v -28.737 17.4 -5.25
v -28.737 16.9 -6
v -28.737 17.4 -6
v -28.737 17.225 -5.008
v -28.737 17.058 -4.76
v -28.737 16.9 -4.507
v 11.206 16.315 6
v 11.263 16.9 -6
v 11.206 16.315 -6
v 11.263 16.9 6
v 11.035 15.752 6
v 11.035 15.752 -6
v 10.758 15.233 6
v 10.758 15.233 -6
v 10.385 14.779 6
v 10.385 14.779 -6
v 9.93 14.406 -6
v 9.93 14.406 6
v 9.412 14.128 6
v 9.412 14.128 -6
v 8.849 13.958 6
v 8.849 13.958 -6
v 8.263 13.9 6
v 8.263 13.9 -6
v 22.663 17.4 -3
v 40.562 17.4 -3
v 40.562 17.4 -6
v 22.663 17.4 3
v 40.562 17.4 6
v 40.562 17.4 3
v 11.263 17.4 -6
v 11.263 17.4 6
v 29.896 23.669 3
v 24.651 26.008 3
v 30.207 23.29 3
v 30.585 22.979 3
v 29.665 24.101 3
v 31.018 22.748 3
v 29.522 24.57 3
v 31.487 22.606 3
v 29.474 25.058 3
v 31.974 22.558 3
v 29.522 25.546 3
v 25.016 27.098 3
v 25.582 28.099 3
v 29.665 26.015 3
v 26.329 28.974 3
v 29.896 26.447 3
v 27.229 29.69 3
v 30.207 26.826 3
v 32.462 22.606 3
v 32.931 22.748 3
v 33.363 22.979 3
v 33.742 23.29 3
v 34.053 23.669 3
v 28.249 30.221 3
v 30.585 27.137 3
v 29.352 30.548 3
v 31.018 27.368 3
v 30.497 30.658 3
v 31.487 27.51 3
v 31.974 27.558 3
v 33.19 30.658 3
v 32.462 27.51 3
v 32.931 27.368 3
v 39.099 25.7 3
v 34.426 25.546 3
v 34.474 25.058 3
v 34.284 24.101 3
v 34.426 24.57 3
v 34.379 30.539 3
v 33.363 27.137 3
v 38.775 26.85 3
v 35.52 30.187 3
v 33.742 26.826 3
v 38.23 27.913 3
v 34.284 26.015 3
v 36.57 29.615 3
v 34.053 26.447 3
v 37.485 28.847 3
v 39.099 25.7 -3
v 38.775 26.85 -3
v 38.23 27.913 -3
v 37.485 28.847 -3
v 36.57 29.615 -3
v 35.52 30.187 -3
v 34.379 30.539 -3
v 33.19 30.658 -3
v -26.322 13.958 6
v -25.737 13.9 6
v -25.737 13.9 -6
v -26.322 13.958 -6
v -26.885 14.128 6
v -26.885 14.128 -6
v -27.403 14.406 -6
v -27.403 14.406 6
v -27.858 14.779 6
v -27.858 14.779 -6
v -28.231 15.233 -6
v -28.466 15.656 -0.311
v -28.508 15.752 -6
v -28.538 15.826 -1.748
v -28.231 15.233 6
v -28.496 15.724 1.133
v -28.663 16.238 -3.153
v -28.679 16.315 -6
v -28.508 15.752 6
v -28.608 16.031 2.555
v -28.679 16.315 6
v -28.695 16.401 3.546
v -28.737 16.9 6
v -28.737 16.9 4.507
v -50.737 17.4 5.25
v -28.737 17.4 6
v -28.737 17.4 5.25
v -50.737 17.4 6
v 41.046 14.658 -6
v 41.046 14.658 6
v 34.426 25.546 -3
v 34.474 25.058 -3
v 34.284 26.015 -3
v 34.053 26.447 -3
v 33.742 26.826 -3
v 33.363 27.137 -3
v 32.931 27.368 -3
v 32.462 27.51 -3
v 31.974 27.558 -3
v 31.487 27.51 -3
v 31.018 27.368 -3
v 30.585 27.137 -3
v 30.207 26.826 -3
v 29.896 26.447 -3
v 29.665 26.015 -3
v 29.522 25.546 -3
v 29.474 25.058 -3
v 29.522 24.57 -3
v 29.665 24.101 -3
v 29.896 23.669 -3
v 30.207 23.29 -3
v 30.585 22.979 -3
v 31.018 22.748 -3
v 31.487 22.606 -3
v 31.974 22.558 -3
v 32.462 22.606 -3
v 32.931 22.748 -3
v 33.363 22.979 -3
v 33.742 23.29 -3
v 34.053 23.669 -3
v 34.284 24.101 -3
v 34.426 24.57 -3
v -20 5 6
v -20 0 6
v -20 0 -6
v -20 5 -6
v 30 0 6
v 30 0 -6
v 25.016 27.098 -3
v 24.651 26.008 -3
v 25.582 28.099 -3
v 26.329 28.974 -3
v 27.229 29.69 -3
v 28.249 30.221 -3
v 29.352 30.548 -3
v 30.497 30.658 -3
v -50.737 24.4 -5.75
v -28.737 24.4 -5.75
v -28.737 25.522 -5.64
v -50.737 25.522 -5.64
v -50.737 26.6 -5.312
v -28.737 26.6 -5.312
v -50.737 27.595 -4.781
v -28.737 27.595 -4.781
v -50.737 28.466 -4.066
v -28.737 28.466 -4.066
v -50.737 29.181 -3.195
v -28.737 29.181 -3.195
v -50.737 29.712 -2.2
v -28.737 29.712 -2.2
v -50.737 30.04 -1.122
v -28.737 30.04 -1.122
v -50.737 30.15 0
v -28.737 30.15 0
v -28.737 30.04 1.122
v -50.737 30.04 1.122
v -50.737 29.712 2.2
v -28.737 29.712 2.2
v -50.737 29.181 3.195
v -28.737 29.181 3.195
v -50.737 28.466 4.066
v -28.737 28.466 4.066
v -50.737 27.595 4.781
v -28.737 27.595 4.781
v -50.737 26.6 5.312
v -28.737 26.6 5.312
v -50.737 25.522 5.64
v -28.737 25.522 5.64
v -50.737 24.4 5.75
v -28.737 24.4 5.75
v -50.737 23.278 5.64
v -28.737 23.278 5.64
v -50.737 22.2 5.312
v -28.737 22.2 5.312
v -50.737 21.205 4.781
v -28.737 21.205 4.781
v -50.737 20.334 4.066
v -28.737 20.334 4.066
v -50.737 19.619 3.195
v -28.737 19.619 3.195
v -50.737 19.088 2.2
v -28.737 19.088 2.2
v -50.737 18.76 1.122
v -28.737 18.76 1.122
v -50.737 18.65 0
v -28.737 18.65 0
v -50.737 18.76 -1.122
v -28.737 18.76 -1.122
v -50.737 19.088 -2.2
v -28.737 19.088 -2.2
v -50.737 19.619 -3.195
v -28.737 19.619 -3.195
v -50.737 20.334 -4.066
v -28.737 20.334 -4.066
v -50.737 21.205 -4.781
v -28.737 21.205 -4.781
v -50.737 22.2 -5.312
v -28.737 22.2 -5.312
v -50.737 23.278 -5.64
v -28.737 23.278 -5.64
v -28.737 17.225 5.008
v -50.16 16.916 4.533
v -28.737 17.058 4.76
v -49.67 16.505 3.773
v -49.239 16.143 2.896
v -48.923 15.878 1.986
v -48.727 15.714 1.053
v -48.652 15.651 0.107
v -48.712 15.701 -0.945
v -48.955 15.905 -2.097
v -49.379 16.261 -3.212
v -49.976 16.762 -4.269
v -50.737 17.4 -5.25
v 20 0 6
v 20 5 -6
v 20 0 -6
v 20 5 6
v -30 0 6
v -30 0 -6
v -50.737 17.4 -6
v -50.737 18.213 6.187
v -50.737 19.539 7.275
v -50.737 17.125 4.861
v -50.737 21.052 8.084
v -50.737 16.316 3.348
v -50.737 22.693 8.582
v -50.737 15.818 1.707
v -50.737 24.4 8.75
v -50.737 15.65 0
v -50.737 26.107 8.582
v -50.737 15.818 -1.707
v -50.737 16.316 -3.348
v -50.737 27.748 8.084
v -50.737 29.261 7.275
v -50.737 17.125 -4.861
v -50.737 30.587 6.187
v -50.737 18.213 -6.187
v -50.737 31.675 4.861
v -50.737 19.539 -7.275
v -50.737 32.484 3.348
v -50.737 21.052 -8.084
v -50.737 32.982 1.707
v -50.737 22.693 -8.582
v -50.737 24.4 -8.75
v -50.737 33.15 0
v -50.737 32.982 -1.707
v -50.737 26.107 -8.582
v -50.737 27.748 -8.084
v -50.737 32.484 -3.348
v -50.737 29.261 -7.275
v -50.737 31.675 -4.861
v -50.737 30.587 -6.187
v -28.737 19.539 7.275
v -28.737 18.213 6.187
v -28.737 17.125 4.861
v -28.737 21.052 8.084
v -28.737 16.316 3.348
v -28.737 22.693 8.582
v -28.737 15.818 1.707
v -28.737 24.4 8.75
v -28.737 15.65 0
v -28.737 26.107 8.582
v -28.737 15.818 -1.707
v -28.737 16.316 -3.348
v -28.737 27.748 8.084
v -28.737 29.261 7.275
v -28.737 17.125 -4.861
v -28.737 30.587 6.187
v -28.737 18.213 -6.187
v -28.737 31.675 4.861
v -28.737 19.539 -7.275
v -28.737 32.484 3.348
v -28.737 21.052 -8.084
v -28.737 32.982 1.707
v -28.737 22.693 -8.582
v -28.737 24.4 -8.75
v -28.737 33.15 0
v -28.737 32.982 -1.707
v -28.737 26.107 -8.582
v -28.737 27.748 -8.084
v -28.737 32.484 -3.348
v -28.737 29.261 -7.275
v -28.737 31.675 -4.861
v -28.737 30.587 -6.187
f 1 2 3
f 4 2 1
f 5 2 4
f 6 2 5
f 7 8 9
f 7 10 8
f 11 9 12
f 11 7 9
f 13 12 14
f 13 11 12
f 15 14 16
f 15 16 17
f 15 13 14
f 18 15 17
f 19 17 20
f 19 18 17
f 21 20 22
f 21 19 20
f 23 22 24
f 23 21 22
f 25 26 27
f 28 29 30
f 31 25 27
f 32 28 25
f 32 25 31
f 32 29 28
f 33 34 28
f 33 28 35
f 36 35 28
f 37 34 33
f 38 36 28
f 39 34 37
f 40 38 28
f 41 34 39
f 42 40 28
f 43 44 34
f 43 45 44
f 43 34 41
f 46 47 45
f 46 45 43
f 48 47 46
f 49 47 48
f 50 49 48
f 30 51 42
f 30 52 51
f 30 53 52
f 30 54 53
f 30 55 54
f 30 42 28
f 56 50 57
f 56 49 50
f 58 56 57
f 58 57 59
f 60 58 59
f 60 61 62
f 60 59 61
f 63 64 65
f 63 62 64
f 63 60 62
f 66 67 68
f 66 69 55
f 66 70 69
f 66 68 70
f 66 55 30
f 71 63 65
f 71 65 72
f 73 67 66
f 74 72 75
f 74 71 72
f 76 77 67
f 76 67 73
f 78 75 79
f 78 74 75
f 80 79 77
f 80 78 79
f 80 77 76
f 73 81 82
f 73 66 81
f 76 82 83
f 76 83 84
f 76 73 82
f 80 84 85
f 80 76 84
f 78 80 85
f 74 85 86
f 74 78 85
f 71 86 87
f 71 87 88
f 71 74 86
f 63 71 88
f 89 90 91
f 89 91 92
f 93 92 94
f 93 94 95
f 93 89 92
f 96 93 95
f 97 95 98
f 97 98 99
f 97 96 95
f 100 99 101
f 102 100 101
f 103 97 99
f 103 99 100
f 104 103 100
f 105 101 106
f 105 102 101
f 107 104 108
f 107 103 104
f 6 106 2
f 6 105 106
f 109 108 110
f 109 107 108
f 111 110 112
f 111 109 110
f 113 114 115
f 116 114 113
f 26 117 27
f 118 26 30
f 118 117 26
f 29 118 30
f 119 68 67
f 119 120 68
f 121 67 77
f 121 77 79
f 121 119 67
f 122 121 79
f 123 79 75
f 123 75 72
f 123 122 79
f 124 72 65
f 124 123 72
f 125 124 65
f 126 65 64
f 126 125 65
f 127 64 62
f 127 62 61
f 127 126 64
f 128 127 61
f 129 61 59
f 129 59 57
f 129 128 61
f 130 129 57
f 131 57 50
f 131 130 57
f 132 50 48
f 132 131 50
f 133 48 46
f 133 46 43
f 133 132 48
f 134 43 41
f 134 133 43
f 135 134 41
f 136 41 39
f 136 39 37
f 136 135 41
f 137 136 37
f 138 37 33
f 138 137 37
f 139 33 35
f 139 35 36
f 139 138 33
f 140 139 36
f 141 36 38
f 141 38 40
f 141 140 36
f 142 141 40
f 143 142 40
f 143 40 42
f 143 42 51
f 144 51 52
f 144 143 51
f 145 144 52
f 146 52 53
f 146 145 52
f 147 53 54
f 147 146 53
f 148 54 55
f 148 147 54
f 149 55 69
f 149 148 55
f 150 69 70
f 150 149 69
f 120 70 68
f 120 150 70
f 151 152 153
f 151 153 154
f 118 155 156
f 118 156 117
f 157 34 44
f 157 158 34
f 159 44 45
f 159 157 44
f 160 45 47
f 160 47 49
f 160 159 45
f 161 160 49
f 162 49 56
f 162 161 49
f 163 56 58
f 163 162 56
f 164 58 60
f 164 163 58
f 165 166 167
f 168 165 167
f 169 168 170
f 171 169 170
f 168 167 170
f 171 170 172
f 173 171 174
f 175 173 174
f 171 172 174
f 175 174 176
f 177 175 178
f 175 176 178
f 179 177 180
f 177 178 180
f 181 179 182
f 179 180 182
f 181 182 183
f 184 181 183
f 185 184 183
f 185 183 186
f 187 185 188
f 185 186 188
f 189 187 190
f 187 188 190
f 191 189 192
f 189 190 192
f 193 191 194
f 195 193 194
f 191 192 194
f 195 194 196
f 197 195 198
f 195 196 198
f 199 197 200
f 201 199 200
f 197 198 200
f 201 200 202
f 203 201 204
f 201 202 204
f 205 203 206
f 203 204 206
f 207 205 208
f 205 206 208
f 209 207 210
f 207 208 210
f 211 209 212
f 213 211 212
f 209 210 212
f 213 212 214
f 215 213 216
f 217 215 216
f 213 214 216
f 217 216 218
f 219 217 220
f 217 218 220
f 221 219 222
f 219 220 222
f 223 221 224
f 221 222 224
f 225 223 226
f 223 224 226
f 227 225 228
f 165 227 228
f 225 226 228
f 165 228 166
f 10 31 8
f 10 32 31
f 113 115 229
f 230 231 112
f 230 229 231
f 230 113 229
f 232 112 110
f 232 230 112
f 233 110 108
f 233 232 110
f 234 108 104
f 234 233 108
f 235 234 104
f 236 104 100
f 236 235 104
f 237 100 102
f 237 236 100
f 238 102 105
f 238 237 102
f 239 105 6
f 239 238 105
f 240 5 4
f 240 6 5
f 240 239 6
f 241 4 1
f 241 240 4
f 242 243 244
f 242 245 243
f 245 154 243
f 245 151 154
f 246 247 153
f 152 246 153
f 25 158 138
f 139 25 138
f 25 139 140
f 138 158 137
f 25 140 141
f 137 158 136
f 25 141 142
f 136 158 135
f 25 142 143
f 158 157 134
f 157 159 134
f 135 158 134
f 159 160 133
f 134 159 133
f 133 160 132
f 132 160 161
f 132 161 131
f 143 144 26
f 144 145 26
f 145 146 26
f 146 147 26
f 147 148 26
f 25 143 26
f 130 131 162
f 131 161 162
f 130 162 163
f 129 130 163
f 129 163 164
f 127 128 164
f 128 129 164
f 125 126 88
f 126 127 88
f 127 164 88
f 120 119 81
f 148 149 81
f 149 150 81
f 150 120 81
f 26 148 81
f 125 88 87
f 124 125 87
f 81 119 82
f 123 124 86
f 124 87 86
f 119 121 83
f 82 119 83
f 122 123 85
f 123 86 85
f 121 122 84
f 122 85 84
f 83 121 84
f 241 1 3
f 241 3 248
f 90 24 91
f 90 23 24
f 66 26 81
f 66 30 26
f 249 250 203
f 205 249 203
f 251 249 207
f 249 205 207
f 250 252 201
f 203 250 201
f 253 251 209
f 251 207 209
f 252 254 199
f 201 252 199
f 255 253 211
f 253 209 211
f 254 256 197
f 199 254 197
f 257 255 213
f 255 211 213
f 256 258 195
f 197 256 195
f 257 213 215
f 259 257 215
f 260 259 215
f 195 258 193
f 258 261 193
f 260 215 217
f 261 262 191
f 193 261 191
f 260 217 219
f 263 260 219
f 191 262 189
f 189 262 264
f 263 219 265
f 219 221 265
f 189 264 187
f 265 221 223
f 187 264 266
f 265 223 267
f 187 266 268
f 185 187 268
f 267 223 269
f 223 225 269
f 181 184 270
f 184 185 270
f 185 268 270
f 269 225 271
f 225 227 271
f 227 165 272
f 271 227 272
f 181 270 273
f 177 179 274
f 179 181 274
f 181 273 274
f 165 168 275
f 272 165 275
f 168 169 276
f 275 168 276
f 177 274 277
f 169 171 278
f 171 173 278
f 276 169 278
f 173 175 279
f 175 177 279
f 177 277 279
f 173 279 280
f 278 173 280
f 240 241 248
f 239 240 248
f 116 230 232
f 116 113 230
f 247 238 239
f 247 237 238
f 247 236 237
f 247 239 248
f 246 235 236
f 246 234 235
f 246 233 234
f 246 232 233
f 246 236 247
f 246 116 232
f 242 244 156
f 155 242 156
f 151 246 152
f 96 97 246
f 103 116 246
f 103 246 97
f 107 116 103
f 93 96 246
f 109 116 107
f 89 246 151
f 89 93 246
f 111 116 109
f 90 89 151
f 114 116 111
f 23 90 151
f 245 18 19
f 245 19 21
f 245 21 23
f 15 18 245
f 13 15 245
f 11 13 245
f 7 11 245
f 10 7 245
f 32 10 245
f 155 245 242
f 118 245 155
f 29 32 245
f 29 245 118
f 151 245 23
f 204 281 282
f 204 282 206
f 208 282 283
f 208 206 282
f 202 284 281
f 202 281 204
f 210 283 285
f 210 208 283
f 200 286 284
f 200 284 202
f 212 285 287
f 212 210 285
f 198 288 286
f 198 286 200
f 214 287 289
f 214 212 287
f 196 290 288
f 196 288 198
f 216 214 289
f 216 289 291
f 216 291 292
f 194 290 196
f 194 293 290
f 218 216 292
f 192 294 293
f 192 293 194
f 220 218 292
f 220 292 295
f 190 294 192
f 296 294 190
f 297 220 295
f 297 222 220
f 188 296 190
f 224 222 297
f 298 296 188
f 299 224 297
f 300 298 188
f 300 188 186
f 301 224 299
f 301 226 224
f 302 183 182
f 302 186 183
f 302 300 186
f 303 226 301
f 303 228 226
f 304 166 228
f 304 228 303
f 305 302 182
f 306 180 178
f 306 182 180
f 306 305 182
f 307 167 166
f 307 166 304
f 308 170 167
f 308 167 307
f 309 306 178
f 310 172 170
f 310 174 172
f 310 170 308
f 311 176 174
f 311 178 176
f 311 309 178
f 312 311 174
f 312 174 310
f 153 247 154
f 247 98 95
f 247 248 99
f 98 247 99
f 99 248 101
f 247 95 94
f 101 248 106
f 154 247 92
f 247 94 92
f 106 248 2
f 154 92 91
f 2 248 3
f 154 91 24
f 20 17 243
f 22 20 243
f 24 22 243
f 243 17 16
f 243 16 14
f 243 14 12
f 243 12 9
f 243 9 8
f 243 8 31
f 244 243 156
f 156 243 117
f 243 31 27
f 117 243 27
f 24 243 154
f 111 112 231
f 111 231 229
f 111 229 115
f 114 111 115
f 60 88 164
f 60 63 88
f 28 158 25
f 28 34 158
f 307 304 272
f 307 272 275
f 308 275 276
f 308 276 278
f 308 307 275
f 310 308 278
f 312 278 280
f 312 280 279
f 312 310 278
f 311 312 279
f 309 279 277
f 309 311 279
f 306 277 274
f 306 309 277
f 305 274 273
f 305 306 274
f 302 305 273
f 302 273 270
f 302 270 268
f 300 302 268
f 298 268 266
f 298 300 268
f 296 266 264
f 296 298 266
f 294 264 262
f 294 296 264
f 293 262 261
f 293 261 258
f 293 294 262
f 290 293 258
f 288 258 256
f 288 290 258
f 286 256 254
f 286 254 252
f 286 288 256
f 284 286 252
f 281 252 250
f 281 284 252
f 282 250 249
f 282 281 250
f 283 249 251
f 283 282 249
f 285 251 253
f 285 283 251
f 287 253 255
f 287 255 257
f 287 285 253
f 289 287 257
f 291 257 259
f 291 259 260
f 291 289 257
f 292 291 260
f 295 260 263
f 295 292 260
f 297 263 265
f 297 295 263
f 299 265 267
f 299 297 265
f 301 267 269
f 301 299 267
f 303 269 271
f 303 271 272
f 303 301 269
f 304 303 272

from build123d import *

# Parameters (mm, degrees)
BOSS_EXTRUDE1_DEPTH = 6
SKETCH1_3_R         = 2.5
BOSS_EXTRUDE2_DEPTH = 3
FILLET1_R           = 3
FILLET2_R           = 6
CUT_EXTRUDE1_START  = -22
SKETCH2_R           = 8.75
CUT_EXTRUDE1_DEPTH  = 22.272822
SKETCH2_5_R         = 8.75
SKETCH2_5_R_2       = 5.75
EXTRUDE_THIN4_DEPTH = 22


with BuildPart() as part:
    # Sketch1 → Boss-Extrude1 (new body, symmetric)
    with BuildSketch(Plane.XY):
        Polygon((20, 0), (30, 0), (41.045558347, 14.657951006), (40.562061127, 17.4), (22.663487489, 17.4), (11.263487489, 17.4), (11.263487489, 13.9), (-28.736512511, 13.9), (-28.736512511, 17.4), (-50.736512511, 17.4), (-30, 0), (-20, 0), (-20, 5), (20, 5), align=None)
    extrude(amount=BOSS_EXTRUDE1_DEPTH, both=True)

    # Sketch1<3> → Boss-Extrude2 (add, symmetric)
    with BuildSketch(Plane.XY):
        Polygon((22.663487489, 17.4), (40.562061127, 17.4), (38.224326656, 30.657951006), (25.724326656, 30.657951006), align=None)
        with Locations((31.974326656, 25.057951006)):
            Circle(SKETCH1_3_R, mode=Mode.SUBTRACT)
    extrude(amount=BOSS_EXTRUDE2_DEPTH, both=True)

    # Fillet1
    fillet1_edges = [part.edges().sort_by_distance(p)[0] for p in [
        (-28.736512511, 13.9, 0),
        (11.263487489, 13.9, 0),
    ]]
    fillet(fillet1_edges, radius=FILLET1_R)

    # Fillet2
    fillet2_edges = [part.edges().sort_by_distance(p)[0] for p in [
        (25.724326656, 30.657951006, 0),
        (38.224326656, 30.657951006, 0),
    ]]
    fillet(fillet2_edges, radius=FILLET2_R)

    # Sketch2 → Cut-Extrude1 (cut)
    with BuildSketch(Plane(origin=(-28.736512511, 0, 0), x_dir=(0, 0, -1), z_dir=(1, 0, 0)).offset(CUT_EXTRUDE1_START)):
        with Locations((0, 24.4)):
            Circle(SKETCH2_R)
    extrude(amount=CUT_EXTRUDE1_DEPTH, mode=Mode.SUBTRACT)


with BuildPart() as body_2:
    # Sketch2<5> → Extrude-Thin4 (new body)
    with BuildSketch(Plane(origin=(-28.736512511, 0, 0), x_dir=(0, 0, -1), z_dir=(1, 0, 0))):
        with Locations((0, 24.4)):
            Circle(SKETCH2_5_R)
        with Locations((0, 24.4)):
            Circle(SKETCH2_5_R_2, mode=Mode.SUBTRACT)
    extrude(amount=-EXTRUDE_THIN4_DEPTH)


solid = Compound([part.part, body_2.part])
